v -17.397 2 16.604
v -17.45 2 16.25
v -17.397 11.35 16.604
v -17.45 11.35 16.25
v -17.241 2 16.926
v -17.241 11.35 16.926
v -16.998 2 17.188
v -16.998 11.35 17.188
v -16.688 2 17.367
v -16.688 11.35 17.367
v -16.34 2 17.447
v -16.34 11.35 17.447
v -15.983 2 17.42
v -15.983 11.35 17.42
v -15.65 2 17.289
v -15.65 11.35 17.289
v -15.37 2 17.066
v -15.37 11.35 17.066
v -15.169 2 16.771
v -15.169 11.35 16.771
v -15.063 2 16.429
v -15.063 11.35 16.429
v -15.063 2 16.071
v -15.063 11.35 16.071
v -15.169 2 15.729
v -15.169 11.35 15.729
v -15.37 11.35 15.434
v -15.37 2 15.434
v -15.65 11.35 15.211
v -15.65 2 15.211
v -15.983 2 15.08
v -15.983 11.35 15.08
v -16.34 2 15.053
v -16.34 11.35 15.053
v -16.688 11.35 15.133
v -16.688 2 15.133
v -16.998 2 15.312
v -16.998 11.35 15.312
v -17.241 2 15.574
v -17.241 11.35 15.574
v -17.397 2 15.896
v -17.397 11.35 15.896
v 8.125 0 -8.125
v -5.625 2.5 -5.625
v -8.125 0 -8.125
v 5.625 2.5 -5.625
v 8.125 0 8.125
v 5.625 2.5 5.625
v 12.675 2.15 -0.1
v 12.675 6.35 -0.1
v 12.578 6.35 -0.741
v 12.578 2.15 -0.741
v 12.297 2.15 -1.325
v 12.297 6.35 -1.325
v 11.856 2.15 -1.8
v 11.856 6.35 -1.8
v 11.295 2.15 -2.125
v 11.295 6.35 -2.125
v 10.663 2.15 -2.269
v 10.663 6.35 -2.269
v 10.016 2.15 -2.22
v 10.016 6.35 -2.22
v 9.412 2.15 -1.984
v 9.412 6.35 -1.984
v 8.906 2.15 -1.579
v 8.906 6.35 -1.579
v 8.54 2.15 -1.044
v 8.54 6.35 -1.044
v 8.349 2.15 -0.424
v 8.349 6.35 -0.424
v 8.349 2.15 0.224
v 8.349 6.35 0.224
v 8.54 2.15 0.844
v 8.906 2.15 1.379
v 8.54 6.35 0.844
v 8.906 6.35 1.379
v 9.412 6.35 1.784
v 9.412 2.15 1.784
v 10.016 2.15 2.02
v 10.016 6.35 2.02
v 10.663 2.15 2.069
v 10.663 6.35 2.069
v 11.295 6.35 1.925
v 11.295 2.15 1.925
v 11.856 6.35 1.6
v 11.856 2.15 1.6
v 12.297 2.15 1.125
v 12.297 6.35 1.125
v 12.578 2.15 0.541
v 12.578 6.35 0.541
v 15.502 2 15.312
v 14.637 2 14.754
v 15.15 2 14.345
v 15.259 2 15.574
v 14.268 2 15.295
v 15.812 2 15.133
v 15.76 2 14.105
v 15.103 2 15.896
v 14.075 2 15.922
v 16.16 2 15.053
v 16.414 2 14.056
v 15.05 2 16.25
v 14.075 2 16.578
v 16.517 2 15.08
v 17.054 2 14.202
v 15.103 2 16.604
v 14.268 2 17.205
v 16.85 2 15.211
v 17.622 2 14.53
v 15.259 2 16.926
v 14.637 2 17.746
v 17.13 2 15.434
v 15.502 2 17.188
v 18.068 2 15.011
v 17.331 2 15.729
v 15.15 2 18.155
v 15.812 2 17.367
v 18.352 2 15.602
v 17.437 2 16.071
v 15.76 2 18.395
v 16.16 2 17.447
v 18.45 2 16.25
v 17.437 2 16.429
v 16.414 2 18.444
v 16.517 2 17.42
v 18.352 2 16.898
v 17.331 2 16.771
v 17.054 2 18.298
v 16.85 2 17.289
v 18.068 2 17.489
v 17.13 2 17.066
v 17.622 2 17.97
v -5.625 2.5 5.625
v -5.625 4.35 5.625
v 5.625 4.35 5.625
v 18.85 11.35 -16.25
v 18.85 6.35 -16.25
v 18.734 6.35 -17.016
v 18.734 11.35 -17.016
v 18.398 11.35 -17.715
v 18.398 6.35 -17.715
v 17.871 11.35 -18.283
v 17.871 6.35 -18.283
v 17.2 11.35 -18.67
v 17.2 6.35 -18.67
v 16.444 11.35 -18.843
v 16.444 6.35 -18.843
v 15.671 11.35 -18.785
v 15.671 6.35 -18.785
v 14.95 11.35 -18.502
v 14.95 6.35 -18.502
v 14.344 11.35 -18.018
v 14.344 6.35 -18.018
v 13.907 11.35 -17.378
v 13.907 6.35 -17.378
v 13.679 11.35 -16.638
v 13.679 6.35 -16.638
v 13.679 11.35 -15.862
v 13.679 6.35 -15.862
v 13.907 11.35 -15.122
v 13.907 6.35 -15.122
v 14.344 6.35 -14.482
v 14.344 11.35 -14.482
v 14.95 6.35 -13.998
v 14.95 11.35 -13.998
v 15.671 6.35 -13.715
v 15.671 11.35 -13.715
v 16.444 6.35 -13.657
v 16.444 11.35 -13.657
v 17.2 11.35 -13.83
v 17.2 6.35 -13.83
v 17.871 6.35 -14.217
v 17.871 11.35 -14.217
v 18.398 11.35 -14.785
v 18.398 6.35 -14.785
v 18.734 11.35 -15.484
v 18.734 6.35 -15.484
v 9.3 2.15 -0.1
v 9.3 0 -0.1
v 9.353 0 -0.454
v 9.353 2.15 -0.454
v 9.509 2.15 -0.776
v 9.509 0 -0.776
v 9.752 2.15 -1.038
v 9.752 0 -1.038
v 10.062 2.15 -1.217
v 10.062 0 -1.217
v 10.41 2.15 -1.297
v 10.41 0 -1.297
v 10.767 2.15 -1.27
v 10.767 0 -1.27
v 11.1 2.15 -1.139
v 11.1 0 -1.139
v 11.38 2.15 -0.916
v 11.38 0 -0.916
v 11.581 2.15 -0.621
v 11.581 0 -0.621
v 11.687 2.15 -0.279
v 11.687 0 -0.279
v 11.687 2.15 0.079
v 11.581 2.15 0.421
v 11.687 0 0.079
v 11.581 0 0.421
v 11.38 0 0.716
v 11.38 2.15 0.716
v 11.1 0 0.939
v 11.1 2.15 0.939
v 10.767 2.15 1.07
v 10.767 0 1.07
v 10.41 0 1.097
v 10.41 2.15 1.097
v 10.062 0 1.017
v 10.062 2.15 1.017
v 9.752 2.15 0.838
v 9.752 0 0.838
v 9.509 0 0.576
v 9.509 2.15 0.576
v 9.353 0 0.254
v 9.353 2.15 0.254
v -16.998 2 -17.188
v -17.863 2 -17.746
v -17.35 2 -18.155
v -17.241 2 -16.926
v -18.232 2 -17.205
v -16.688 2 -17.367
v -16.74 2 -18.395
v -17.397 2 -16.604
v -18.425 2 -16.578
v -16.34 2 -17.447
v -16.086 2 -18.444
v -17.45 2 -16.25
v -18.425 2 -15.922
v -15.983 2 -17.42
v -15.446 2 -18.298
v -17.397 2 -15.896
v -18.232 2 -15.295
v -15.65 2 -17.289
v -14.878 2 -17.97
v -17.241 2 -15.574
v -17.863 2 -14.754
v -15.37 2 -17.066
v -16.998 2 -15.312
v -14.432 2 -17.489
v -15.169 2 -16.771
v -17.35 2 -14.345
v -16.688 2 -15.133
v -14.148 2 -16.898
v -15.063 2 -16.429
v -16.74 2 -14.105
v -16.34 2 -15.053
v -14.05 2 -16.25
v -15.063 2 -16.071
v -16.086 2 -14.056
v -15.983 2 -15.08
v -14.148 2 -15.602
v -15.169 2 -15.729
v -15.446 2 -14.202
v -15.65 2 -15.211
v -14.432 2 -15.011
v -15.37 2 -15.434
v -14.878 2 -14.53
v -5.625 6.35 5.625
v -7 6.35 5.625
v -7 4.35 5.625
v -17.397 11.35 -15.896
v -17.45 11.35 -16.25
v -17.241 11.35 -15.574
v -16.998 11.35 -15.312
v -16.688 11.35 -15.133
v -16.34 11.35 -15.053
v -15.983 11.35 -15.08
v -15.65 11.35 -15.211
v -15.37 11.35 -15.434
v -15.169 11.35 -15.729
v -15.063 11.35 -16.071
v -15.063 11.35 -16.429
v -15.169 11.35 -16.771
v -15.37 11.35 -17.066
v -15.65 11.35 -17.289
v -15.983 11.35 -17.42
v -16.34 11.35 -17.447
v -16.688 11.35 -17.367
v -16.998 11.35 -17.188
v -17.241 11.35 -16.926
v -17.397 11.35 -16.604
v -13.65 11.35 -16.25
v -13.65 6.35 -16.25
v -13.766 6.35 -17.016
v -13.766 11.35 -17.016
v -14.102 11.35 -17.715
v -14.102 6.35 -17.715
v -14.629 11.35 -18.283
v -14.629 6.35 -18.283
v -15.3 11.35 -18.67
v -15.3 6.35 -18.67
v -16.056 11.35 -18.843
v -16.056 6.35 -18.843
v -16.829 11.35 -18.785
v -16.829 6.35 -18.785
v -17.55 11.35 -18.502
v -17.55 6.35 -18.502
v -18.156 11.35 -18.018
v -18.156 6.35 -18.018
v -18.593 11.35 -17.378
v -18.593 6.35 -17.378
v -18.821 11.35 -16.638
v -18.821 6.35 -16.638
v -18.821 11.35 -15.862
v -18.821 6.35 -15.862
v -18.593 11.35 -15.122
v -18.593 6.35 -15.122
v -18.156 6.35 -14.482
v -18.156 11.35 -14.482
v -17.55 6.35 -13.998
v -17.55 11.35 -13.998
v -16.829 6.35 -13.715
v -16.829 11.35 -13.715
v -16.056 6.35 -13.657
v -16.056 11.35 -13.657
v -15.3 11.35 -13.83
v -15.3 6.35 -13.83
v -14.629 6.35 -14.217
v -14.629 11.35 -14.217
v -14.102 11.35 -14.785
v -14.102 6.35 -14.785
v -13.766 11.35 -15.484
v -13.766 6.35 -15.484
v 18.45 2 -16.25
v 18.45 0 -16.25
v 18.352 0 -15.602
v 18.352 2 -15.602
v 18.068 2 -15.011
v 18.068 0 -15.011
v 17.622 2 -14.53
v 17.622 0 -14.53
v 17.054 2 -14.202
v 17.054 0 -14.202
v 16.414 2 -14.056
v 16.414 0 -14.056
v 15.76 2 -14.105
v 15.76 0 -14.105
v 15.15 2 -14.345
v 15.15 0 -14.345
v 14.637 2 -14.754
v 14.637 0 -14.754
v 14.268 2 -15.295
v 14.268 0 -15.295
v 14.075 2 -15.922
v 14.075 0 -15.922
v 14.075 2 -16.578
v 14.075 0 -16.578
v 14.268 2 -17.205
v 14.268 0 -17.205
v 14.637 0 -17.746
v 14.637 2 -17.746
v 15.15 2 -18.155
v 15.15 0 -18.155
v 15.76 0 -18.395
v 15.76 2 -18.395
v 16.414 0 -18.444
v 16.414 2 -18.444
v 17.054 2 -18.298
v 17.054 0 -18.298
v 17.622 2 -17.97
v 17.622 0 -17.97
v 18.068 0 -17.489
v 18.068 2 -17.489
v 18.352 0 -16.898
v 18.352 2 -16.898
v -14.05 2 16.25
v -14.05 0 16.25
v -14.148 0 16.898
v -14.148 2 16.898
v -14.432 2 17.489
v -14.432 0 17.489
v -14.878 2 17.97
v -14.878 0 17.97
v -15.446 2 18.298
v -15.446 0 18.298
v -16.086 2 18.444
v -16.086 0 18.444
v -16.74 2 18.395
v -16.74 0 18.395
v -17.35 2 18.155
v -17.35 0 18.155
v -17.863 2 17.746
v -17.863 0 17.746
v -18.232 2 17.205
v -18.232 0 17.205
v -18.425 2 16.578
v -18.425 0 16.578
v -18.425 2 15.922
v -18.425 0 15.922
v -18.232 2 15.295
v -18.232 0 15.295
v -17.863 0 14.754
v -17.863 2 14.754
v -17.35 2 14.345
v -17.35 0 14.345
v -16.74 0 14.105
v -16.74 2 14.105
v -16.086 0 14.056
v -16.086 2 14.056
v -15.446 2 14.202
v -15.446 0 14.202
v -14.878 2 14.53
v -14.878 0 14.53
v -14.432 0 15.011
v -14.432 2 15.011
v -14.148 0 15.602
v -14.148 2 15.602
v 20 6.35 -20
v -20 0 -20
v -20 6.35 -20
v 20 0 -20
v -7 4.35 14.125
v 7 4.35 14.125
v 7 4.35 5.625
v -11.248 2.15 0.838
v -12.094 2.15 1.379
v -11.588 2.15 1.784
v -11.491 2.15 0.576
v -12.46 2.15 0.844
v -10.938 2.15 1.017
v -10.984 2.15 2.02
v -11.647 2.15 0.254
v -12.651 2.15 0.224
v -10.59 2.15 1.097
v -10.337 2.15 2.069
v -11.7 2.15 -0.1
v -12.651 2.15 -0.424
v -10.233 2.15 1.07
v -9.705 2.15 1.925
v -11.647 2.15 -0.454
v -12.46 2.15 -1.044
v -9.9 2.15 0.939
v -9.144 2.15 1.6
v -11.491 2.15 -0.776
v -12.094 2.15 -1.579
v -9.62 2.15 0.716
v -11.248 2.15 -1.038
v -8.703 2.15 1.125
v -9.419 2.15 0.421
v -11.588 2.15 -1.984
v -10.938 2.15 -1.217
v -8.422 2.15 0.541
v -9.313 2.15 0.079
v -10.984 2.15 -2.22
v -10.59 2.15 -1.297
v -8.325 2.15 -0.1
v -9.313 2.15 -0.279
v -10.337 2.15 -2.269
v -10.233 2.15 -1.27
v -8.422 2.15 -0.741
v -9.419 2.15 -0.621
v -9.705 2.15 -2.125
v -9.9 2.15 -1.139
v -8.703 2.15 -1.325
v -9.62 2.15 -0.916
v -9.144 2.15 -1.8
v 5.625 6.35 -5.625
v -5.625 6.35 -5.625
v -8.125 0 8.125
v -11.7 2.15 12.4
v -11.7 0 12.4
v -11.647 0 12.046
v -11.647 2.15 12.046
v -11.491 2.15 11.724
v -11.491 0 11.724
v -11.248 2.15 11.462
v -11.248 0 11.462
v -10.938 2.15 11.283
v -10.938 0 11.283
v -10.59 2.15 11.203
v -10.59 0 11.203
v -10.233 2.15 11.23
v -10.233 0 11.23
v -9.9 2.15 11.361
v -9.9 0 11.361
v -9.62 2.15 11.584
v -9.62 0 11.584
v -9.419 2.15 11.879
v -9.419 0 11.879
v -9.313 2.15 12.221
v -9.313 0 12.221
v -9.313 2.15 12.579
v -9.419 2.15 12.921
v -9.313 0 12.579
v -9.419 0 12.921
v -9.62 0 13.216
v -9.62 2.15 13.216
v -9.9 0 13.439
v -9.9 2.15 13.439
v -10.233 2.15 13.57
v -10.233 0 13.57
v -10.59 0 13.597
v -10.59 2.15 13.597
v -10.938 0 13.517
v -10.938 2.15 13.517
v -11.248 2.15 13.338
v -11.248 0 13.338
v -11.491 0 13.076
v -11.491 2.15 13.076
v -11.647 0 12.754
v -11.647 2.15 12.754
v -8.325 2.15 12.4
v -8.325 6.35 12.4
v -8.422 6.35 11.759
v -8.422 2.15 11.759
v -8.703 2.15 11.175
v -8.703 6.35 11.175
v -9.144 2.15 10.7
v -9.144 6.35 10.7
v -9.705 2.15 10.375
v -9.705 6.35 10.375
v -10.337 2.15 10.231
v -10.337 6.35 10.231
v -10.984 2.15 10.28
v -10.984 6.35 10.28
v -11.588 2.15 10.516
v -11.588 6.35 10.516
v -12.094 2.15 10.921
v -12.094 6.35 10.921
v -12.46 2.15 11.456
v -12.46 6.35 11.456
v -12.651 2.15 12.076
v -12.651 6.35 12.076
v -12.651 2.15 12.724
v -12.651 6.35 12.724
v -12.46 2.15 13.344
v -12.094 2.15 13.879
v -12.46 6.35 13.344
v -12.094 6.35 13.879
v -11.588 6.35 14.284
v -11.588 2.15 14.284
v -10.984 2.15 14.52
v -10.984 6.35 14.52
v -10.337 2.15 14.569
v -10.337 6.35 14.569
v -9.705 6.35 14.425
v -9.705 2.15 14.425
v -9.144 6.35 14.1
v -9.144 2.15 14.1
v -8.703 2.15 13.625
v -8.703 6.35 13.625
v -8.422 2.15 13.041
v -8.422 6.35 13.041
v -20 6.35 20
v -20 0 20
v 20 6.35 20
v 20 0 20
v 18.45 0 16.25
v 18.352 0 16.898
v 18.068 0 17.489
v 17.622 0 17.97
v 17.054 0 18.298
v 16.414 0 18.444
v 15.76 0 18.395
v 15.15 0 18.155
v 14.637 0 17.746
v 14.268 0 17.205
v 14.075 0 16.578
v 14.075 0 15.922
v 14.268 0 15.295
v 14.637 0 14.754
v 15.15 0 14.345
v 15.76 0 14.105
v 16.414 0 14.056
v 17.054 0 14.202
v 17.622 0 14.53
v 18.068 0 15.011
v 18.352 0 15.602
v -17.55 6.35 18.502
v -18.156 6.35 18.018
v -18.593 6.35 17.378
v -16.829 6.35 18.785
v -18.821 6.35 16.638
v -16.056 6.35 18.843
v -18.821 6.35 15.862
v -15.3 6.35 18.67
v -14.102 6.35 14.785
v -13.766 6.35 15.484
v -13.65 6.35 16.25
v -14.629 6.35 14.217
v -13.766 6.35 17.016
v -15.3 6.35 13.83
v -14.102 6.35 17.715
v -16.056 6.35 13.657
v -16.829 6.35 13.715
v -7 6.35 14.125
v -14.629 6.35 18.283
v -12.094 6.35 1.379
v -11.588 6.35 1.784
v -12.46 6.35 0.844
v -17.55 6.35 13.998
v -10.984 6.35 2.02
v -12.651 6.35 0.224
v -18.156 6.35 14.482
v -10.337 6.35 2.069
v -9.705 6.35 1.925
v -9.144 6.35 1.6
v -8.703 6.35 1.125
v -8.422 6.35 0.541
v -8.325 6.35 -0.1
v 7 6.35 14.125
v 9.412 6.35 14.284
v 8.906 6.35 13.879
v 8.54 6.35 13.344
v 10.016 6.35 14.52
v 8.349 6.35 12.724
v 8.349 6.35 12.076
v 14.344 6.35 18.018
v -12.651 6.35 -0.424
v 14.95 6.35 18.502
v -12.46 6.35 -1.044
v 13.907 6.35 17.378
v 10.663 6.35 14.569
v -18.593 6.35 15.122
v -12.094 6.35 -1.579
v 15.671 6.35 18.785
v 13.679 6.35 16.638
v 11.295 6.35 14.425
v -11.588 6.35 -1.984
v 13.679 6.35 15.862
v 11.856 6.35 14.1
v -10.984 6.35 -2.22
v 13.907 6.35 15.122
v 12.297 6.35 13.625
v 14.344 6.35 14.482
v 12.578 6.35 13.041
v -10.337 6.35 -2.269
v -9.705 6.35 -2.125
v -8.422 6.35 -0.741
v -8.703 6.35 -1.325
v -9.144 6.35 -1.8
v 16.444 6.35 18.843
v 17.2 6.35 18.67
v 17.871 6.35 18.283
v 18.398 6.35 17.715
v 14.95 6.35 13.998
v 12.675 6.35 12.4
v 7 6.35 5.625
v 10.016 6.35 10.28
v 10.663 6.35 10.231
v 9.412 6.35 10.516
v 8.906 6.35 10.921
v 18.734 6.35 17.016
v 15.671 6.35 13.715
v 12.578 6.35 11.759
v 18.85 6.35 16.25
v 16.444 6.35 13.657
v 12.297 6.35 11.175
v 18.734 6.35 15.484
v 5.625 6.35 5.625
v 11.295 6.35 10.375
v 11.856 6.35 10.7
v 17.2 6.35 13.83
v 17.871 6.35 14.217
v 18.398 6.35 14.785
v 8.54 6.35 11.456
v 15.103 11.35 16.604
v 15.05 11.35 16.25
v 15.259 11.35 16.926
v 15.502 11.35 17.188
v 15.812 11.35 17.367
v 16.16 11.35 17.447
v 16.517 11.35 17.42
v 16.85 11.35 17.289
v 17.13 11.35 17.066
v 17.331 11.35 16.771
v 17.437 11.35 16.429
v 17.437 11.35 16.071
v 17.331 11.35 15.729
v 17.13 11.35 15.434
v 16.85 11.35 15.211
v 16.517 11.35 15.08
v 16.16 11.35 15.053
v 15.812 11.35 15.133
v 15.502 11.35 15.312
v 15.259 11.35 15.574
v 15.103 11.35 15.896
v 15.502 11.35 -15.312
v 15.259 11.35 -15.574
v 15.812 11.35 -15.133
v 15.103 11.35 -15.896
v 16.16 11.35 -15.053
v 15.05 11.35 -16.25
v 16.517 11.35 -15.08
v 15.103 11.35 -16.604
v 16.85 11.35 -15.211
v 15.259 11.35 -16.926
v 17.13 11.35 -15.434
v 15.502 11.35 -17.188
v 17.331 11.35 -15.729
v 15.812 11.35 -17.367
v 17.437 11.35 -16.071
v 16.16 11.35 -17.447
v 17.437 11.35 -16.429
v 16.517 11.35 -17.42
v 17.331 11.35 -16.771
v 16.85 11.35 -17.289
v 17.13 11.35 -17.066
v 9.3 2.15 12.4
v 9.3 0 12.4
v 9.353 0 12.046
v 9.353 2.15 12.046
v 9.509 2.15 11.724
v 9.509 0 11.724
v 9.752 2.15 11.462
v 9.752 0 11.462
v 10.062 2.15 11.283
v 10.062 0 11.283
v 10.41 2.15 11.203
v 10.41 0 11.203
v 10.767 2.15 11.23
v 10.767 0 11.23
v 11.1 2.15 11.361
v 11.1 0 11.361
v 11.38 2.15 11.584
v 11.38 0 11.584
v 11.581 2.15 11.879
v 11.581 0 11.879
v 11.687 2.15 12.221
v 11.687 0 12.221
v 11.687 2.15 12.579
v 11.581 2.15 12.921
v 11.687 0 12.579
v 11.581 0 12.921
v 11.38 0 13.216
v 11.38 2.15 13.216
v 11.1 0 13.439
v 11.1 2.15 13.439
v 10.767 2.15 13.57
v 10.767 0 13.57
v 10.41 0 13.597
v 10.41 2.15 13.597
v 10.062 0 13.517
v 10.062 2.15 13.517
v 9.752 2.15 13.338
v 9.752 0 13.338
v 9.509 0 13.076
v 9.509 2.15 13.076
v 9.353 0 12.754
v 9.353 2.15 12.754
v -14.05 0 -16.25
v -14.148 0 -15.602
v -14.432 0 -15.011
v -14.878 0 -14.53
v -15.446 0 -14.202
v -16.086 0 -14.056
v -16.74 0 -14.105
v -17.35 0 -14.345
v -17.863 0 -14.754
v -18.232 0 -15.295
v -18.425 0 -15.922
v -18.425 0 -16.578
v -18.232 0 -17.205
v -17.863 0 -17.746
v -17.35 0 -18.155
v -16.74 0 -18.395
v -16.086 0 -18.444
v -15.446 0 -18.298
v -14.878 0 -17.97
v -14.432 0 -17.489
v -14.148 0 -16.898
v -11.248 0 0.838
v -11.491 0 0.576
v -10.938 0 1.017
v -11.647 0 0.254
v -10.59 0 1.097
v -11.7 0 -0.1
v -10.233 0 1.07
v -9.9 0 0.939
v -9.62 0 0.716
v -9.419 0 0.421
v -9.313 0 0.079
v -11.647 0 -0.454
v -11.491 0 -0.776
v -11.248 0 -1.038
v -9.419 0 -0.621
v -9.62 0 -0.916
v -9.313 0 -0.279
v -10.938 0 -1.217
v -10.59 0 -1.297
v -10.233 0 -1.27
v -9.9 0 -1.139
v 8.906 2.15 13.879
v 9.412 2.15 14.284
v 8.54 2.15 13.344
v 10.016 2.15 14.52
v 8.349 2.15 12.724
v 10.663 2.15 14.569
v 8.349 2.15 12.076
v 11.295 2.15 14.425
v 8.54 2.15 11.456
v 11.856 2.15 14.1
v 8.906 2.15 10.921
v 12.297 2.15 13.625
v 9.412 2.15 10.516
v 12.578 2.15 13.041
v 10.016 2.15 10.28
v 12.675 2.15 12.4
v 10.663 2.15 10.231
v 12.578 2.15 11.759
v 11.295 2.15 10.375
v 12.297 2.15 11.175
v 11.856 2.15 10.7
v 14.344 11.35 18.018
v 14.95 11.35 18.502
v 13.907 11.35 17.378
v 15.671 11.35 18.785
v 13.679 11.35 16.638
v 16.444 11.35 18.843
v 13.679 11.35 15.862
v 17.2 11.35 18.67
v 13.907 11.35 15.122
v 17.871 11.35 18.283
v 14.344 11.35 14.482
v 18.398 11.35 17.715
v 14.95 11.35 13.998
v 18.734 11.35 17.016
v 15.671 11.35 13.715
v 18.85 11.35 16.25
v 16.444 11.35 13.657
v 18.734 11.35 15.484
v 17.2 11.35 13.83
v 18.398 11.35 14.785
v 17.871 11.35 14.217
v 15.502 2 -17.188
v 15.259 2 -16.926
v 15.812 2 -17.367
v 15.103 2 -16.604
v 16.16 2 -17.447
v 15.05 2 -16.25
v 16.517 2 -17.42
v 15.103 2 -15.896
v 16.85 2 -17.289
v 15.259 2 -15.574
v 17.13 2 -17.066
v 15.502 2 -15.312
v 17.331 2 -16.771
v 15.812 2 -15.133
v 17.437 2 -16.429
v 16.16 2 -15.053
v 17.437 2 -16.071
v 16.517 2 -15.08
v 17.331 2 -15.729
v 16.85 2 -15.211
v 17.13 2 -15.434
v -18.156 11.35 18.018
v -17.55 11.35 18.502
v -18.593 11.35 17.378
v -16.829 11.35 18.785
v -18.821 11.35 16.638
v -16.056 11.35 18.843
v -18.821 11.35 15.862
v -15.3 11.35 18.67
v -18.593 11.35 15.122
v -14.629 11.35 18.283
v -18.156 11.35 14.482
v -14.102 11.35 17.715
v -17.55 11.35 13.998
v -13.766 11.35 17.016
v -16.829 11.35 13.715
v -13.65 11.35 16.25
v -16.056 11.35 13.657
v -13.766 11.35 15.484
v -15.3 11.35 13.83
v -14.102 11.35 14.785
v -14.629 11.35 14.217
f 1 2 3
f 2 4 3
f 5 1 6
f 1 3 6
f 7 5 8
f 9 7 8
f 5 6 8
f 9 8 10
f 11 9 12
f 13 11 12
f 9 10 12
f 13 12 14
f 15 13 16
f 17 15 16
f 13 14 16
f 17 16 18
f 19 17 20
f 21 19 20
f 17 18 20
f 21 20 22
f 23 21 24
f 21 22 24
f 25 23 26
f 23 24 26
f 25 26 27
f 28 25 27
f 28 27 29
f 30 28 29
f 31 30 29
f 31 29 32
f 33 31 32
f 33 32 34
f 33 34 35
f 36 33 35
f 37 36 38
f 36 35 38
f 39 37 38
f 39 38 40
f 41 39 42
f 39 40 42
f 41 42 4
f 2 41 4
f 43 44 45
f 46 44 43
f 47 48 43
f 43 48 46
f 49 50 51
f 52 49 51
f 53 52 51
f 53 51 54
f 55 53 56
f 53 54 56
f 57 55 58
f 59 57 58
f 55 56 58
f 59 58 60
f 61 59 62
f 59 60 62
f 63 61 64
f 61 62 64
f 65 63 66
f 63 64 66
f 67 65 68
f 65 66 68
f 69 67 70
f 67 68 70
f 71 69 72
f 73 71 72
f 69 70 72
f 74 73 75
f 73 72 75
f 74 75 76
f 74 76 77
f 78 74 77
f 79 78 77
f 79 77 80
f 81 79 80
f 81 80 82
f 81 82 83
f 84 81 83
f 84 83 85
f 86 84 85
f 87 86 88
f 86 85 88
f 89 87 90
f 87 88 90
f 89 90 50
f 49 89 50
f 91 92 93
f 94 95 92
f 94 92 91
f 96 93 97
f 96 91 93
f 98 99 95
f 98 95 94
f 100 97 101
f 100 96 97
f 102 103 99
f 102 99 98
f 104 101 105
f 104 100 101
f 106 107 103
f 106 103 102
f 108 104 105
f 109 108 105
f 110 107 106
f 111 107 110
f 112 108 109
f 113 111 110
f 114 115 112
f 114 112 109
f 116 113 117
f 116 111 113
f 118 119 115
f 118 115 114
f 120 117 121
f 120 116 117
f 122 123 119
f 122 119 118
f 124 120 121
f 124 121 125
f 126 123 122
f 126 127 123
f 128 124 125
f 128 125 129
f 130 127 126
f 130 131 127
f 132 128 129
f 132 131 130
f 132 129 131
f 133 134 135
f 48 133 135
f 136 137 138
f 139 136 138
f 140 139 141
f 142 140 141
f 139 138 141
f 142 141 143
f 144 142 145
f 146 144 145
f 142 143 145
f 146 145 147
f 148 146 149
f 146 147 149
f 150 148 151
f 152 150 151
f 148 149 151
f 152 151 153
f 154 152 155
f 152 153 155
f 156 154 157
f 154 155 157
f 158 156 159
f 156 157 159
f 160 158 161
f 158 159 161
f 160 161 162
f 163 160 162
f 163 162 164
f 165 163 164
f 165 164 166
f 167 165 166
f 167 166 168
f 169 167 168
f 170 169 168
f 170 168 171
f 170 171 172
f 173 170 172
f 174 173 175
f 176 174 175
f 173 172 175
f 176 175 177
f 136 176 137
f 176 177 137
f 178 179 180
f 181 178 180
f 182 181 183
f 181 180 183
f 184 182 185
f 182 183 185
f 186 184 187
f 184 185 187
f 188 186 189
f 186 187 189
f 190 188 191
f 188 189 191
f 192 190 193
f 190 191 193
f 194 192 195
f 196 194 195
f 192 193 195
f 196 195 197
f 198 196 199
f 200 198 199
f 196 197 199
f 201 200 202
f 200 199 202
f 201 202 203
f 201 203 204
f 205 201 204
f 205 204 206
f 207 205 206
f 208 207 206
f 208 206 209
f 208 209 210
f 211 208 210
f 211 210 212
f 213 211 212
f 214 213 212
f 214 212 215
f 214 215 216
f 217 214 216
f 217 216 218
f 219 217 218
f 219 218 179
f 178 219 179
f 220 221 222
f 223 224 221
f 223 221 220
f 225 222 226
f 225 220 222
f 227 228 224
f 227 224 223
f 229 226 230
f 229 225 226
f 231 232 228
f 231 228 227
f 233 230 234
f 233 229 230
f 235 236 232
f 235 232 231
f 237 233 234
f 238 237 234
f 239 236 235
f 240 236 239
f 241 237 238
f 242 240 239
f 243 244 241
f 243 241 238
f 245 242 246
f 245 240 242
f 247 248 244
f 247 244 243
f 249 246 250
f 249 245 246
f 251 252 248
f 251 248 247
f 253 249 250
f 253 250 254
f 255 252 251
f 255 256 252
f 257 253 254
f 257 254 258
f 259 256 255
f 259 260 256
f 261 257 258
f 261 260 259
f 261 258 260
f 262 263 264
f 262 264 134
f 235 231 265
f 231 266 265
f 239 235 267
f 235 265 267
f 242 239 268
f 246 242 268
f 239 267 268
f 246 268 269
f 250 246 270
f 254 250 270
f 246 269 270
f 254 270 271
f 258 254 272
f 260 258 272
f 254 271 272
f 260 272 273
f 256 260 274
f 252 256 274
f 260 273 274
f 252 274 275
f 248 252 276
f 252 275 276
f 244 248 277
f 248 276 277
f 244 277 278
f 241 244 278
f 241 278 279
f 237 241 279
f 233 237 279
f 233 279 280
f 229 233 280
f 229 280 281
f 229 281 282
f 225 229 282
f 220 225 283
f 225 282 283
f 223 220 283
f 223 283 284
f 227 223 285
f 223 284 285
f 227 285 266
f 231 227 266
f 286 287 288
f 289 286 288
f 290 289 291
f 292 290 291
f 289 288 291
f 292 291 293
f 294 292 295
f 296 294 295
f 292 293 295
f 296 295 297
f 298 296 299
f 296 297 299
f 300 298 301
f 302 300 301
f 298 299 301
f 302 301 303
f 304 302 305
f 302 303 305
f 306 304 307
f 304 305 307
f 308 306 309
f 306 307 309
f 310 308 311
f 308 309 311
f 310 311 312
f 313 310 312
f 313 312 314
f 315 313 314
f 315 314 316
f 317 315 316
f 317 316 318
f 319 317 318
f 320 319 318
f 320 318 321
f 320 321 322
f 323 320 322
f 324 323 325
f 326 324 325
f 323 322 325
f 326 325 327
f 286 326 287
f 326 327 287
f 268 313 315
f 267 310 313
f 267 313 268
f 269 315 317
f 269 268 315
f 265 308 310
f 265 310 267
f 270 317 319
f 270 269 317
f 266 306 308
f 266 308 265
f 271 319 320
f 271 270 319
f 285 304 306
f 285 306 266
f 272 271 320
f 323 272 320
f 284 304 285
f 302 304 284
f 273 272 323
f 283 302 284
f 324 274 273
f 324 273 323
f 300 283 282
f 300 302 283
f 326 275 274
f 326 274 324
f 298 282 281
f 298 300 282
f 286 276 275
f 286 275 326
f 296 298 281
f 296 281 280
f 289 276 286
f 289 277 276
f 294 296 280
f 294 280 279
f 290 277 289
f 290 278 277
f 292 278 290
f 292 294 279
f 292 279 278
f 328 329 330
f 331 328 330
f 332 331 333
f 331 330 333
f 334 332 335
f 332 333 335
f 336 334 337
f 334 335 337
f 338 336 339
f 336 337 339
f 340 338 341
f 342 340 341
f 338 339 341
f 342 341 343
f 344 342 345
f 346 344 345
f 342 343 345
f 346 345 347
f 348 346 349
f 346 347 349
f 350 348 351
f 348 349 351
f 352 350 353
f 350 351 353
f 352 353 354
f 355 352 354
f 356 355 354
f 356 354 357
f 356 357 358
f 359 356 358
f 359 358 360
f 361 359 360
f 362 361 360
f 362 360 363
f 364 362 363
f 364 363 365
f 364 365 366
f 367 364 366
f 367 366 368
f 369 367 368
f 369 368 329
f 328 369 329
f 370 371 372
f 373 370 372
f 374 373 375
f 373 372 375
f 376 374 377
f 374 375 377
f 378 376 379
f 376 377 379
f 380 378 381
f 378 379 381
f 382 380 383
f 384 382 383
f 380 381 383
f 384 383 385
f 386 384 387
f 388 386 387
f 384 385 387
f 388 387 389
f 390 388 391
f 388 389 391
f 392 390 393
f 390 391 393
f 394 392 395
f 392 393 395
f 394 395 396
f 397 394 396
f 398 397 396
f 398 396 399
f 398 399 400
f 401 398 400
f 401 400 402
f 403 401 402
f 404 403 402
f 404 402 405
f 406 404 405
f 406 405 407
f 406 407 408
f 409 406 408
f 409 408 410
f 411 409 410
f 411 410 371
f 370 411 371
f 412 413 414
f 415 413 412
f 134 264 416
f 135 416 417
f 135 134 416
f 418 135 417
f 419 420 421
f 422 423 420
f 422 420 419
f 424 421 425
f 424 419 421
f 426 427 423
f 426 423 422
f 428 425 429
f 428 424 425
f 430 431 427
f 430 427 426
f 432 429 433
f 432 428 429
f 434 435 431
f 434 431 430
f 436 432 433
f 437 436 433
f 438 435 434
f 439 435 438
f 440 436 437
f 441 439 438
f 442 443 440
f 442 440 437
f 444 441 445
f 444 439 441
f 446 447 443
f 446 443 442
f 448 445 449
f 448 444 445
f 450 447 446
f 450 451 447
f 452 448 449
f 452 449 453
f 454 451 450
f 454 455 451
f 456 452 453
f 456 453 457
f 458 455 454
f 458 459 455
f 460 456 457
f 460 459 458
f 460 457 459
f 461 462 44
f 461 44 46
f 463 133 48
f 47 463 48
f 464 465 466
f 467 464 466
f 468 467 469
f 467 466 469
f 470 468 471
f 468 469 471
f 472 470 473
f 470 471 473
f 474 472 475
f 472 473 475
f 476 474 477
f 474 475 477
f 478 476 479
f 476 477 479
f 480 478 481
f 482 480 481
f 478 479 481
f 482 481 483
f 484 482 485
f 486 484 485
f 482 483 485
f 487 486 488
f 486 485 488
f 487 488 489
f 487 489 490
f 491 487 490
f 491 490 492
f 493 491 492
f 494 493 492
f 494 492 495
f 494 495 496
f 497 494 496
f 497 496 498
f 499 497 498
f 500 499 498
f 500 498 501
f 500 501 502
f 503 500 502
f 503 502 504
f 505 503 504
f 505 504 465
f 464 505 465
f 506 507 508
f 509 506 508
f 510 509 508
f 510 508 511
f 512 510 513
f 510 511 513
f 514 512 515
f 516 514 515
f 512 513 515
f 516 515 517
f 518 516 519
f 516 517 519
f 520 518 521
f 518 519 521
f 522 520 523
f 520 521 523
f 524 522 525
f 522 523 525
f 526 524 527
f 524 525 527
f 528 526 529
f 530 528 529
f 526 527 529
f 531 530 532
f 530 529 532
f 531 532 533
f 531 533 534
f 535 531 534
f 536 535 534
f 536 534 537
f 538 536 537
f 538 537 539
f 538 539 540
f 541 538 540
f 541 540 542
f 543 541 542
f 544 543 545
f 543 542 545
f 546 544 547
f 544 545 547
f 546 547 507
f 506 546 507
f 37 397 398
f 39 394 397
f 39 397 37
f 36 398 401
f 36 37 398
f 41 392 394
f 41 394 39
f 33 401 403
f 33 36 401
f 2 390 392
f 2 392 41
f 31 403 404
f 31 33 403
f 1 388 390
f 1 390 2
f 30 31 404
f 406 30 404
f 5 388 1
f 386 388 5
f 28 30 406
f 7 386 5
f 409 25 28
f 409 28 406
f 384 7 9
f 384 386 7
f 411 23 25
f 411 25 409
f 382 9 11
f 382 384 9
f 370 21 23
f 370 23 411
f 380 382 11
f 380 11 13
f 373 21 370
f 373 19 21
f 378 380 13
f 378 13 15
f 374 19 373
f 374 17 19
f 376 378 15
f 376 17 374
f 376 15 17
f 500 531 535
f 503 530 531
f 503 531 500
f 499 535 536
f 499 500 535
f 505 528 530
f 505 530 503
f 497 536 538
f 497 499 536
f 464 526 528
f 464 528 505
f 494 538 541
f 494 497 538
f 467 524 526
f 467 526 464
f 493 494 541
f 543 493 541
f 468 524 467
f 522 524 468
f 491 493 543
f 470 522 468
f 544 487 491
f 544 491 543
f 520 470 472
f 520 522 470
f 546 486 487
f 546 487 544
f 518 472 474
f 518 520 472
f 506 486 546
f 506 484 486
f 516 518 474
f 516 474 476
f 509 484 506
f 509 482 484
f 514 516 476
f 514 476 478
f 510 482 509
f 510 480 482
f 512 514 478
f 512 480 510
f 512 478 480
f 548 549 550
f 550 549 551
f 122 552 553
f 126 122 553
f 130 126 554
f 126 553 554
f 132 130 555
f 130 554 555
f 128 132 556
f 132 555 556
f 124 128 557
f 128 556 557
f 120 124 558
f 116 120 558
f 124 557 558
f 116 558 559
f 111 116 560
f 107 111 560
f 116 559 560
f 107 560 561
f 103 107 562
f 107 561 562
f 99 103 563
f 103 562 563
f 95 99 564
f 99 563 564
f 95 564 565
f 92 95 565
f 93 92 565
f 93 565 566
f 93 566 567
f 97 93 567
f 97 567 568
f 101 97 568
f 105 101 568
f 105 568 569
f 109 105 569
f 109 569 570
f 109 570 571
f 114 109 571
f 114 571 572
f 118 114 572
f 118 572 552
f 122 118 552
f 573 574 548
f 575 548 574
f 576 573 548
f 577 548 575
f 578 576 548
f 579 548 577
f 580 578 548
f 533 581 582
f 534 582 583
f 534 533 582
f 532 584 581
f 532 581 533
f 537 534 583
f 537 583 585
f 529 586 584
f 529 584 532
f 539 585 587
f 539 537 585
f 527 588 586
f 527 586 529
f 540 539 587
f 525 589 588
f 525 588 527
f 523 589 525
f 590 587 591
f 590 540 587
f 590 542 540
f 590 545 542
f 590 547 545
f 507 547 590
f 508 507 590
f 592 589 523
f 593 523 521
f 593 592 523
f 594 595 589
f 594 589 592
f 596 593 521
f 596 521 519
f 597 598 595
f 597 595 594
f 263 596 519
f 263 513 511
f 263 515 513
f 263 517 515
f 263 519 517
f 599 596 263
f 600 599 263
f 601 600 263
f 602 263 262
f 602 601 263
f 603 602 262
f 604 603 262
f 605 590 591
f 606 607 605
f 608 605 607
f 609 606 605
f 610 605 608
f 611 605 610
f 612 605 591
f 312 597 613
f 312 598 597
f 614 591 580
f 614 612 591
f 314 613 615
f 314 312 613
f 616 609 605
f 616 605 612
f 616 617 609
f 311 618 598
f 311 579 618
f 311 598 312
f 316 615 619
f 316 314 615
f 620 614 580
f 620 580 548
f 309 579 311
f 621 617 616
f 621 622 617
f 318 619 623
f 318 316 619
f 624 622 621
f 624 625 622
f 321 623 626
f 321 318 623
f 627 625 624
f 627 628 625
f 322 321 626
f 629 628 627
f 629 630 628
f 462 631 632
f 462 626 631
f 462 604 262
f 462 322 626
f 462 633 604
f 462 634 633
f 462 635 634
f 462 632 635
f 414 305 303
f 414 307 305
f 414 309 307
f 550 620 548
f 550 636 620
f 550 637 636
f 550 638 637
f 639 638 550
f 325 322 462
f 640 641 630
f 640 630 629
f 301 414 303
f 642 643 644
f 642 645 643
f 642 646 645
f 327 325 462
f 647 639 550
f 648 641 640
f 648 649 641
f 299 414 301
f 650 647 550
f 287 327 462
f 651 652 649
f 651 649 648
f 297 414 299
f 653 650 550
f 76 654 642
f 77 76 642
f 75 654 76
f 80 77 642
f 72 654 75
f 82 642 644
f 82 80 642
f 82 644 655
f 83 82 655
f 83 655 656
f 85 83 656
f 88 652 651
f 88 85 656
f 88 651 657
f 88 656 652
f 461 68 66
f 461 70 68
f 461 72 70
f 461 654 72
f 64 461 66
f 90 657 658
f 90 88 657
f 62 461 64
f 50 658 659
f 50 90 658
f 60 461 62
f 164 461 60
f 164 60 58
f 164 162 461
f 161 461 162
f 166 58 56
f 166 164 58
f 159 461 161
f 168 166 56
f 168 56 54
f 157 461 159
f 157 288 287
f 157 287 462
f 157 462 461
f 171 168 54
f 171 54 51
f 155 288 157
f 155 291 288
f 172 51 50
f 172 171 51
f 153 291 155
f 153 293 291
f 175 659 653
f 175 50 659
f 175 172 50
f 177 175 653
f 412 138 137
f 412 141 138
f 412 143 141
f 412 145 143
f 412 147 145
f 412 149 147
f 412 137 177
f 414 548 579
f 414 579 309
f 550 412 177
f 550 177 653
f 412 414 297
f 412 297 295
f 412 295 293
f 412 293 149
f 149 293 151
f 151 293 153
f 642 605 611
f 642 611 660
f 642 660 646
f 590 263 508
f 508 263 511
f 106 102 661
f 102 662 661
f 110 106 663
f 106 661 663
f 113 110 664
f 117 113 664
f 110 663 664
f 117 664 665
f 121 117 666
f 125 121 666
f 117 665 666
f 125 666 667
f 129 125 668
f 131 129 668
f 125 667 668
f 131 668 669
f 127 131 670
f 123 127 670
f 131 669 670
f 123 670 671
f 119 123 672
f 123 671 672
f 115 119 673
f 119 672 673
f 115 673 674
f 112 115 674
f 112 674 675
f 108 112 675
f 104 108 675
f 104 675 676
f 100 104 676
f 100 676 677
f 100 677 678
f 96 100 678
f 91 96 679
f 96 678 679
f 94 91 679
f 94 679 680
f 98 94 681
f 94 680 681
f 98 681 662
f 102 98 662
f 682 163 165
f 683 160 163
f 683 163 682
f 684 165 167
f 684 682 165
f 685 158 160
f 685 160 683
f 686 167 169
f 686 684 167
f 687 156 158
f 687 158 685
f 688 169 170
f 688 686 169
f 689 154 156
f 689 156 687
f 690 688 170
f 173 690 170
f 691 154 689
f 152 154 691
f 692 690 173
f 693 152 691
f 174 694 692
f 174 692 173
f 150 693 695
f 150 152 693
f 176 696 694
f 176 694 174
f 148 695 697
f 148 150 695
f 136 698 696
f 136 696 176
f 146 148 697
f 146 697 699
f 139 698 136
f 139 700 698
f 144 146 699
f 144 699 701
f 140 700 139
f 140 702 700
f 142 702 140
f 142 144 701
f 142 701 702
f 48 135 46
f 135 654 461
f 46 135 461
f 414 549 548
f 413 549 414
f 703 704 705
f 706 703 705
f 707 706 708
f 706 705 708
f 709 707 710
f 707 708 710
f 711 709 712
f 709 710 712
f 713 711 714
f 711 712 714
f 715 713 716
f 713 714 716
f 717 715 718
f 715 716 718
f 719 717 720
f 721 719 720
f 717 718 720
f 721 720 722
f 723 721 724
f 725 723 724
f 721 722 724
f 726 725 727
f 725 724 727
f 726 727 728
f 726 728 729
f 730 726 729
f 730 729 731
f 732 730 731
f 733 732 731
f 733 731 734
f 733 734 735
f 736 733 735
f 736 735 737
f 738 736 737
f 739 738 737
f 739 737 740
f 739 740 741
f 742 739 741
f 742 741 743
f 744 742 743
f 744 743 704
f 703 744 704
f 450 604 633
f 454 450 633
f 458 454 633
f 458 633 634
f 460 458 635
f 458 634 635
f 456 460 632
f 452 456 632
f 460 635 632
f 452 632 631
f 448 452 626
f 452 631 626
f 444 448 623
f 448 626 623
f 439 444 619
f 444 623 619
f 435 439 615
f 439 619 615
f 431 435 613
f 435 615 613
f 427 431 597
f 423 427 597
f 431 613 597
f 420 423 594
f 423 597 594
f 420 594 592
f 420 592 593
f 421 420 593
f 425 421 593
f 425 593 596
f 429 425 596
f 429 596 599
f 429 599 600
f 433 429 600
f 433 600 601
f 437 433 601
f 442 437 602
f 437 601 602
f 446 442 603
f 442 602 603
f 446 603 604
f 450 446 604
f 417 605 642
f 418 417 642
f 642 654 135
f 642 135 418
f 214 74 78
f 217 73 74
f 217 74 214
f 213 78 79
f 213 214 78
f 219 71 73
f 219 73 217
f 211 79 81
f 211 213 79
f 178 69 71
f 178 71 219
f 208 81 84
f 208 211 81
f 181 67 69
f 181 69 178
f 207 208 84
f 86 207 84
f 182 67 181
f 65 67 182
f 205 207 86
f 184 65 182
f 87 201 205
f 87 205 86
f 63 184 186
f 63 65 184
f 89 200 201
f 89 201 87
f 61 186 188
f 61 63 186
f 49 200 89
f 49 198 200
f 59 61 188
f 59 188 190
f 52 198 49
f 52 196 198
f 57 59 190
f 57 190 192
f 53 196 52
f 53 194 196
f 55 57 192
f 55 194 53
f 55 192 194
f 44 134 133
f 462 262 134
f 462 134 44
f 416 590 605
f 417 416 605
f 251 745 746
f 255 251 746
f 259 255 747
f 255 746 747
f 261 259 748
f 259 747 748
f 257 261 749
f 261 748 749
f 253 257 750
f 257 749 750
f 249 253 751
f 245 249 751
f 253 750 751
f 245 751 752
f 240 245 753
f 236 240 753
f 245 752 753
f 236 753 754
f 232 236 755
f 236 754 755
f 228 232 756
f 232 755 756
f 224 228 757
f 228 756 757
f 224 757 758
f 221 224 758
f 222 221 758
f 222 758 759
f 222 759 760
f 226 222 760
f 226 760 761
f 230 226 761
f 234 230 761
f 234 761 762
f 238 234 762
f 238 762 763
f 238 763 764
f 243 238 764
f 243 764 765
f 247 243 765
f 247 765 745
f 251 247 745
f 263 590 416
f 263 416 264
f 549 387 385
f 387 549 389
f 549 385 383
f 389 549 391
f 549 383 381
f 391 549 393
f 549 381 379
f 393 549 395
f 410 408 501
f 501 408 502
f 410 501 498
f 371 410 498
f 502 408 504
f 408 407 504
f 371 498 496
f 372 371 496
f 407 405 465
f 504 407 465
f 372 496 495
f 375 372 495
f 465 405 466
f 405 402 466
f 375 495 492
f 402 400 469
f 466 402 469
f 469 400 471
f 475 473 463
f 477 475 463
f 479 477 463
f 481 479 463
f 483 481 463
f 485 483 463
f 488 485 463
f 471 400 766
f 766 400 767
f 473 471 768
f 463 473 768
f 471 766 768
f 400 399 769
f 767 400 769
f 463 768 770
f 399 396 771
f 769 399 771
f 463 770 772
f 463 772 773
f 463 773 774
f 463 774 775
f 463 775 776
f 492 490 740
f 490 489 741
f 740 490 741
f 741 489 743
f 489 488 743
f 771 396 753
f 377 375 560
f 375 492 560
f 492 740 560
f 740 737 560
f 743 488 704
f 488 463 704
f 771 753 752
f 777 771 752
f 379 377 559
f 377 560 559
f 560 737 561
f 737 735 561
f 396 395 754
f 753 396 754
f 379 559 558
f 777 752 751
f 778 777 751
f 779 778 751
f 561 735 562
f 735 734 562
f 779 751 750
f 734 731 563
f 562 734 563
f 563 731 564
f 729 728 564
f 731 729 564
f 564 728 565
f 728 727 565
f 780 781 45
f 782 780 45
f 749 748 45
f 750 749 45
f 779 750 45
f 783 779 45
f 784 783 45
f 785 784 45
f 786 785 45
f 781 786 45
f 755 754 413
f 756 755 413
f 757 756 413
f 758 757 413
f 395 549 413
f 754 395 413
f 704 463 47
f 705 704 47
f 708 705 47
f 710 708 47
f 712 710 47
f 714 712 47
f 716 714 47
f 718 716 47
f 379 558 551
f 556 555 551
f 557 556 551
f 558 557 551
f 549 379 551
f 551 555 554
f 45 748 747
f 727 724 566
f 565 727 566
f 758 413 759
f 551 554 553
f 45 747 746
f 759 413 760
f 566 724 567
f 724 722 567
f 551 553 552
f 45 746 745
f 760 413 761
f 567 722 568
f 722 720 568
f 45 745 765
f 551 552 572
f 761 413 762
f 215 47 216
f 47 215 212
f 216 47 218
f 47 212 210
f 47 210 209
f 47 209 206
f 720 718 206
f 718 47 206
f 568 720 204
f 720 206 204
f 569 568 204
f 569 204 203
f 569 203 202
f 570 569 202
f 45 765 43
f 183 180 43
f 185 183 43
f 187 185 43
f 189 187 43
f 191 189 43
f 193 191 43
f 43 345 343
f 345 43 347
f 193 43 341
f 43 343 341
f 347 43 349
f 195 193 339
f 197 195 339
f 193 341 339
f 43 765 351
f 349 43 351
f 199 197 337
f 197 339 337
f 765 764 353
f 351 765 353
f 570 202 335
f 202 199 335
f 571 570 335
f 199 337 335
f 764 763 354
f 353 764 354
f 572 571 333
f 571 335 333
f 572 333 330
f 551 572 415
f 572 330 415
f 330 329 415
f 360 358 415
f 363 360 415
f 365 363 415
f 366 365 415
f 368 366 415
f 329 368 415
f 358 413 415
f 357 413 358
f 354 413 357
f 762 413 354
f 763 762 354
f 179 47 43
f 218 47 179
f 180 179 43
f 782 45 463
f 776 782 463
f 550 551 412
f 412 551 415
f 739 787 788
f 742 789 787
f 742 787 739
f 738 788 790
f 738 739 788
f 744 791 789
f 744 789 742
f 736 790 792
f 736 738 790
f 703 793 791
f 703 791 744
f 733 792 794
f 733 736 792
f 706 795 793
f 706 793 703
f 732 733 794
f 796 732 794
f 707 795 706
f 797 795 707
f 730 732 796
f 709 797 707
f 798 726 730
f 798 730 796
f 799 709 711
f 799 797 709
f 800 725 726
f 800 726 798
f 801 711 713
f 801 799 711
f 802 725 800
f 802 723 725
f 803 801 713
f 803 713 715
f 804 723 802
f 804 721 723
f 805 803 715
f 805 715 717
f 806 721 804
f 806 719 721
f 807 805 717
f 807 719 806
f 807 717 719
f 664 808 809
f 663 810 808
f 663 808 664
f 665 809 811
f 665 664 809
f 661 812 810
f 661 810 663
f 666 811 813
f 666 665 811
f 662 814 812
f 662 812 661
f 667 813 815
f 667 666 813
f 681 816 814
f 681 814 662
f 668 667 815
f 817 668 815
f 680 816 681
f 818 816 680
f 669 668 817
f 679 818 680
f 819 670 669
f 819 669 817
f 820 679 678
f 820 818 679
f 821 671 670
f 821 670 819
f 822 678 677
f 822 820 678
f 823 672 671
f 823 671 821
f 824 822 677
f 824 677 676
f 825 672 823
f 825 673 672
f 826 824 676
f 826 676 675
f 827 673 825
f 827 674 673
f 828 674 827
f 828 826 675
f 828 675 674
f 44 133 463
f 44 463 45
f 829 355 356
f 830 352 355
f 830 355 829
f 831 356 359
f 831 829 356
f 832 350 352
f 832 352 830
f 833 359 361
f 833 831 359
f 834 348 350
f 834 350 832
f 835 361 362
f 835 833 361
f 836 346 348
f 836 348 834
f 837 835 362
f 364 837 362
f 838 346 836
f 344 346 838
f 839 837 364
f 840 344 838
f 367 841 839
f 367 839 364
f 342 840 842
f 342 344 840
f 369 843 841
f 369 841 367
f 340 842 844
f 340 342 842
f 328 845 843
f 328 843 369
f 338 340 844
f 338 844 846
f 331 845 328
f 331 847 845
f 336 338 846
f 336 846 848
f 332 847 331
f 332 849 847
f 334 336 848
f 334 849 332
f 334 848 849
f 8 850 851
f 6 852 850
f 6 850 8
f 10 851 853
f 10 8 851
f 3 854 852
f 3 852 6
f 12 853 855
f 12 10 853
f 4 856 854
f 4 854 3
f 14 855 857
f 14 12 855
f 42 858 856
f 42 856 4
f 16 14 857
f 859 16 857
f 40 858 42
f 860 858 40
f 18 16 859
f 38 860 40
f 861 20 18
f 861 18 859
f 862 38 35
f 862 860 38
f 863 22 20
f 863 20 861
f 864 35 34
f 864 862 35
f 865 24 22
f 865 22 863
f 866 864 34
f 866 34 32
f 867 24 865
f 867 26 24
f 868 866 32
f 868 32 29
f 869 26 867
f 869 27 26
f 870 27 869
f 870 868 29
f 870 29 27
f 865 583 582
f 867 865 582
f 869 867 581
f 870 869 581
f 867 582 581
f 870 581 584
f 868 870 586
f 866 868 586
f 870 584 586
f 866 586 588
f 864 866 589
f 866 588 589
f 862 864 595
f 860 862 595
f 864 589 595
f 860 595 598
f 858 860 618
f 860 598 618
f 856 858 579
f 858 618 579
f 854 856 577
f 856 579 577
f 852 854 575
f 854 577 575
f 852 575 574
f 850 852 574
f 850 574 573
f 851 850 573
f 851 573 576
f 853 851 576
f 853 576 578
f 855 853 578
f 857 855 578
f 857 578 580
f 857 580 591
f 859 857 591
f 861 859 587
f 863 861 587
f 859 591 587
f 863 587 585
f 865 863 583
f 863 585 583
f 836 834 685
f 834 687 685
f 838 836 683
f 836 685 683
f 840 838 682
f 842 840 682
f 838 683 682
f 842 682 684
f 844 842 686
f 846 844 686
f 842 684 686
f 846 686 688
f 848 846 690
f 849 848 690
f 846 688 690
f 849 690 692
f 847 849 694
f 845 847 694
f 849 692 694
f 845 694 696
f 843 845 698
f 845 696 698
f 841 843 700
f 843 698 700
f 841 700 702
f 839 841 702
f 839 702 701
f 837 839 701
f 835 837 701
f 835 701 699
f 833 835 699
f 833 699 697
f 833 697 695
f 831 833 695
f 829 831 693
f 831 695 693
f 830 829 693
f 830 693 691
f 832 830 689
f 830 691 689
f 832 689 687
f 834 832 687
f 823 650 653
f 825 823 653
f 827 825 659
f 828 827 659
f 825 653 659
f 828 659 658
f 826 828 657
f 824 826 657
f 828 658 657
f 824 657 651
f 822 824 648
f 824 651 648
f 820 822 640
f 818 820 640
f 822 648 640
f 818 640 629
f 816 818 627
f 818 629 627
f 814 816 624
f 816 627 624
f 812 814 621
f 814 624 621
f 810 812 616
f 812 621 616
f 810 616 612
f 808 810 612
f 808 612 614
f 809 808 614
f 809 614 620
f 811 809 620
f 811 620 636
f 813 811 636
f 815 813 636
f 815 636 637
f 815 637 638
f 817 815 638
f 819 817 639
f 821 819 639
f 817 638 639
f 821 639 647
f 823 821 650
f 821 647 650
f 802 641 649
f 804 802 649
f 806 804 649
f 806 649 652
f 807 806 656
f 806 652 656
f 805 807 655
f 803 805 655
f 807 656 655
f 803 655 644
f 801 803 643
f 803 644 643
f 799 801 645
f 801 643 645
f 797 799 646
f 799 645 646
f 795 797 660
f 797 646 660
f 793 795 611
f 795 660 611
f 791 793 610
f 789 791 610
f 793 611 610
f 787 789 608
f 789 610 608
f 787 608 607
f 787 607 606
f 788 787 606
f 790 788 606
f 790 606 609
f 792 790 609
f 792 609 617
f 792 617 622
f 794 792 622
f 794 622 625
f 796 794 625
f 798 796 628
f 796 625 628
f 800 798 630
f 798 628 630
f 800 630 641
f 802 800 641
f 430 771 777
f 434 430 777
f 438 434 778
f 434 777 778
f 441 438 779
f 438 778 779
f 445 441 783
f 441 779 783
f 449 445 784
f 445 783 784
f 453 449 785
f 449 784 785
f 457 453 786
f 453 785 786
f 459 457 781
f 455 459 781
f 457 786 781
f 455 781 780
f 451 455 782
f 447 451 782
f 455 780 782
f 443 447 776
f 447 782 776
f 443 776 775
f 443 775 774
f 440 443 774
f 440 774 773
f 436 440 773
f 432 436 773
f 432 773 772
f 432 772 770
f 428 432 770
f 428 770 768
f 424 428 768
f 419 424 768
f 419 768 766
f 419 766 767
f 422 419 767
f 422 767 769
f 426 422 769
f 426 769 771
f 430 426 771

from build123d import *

# Parameters (mm, degrees)
SKETCH1_W                      = 40
SKETCH1_H                      = 40
BOSS_EXTRUDE1_DEPTH            = 6.35
SKETCH2_W                      = 11.25
SKETCH2_H                      = 11.25
CUT_EXTRUDE1_DEPTH             = 7.35
SKETCH3_W                      = 14
SKETCH3_H                      = 8.5
CUT_EXTRUDE2_DEPTH             = 2
M2_CLEARANCE_HOLE1_D           = 2.4
SKETCH6_R                      = 2.6
BOSS_EXTRUDE2_DEPTH            = 5
CBORE_FOR_M2_SHCS1_D           = 2.4
CBORE_FOR_M2_SHCS1_CBORE_D     = 4.4
CBORE_FOR_M2_SHCS1_CBORE_DEPTH = 2
SKETCH13_R                     = 2.175
CUT_EXTRUDE4_DEPTH             = 4.2
CHAMFER1_SIZE                  = 2.5


with BuildPart() as part:
    # Sketch1 → Boss-Extrude1 (new body)
    with BuildSketch(Plane(origin=(0, 0, 0), x_dir=(1, 0, 0), z_dir=(0, 1, 0))):
        Rectangle(SKETCH1_W, SKETCH1_H)
    extrude(amount=BOSS_EXTRUDE1_DEPTH)

    # Sketch2 → Cut-Extrude1 (cut, through all)
    with BuildSketch(Plane(origin=(0, 6.35, 0), x_dir=(1, 0, 0), z_dir=(0, 1, 0))):
        Rectangle(SKETCH2_W, SKETCH2_H)
    extrude(amount=-CUT_EXTRUDE1_DEPTH, mode=Mode.SUBTRACT)

    # Sketch3 → Cut-Extrude2 (cut)
    with BuildSketch(Plane(origin=(0, 6.35, 0), x_dir=(1, 0, 0), z_dir=(0, 1, 0))):
        with Locations((0, -9.875)):
            Rectangle(SKETCH3_W, SKETCH3_H)
    extrude(amount=-CUT_EXTRUDE2_DEPTH, mode=Mode.SUBTRACT)

    # M2 Clearance Hole1 (through all)
    with Locations(Plane(origin=(0, 6.35, 0), x_dir=(1, 0, 0), z_dir=(0, 1, 0))):
        with Locations((10.5, 0.1), (10.5, -12.4), (-10.5, -12.4), (-10.5, 0.1)):
            Hole(M2_CLEARANCE_HOLE1_D / 2)

    # Sketch6 → Boss-Extrude2 (add)
    with BuildSketch(Plane(origin=(0, 6.35, 0), x_dir=(1, 0, 0), z_dir=(0, 1, 0))):
        with Locations((-16.25, 16.25)):
            Circle(SKETCH6_R)
        with Locations((16.25, 16.25)):
            Circle(SKETCH6_R)
        with Locations((16.25, -16.25)):
            Circle(SKETCH6_R)
        with Locations((-16.25, -16.25)):
            Circle(SKETCH6_R)
    extrude(amount=BOSS_EXTRUDE2_DEPTH)

    # CBORE for M2 SHCS1 (through all)
    with Locations(Plane.XZ):
        with Locations((-16.25, -16.25), (-16.25, 16.25), (16.25, 16.25), (16.25, -16.25)):
            CounterBoreHole(CBORE_FOR_M2_SHCS1_D / 2, CBORE_FOR_M2_SHCS1_CBORE_D / 2, CBORE_FOR_M2_SHCS1_CBORE_DEPTH)

    # Sketch13 → Cut-Extrude4 (cut)
    with BuildSketch(Plane(origin=(0, 6.35, 0), x_dir=(1, 0, 0), z_dir=(0, 1, 0))):
        with Locations((-10.5, -12.4)):
            Circle(SKETCH13_R)
        with Locations((-10.5, 0.1)):
            Circle(SKETCH13_R)
        with Locations((10.5, -12.4)):
            Circle(SKETCH13_R)
        with Locations((10.5, 0.1)):
            Circle(SKETCH13_R)
    extrude(amount=-CUT_EXTRUDE4_DEPTH, mode=Mode.SUBTRACT)

    # Chamfer1
    chamfer1_edges = [part.edges().sort_by_distance(p)[0] for p in [
        (5.625, 0, 0),
        (0, 0, 5.625),
        (-5.625, 0, 0),
        (0, 0, -5.625),
    ]]
    chamfer(chamfer1_edges, length=CHAMFER1_SIZE)


solid = part.part
